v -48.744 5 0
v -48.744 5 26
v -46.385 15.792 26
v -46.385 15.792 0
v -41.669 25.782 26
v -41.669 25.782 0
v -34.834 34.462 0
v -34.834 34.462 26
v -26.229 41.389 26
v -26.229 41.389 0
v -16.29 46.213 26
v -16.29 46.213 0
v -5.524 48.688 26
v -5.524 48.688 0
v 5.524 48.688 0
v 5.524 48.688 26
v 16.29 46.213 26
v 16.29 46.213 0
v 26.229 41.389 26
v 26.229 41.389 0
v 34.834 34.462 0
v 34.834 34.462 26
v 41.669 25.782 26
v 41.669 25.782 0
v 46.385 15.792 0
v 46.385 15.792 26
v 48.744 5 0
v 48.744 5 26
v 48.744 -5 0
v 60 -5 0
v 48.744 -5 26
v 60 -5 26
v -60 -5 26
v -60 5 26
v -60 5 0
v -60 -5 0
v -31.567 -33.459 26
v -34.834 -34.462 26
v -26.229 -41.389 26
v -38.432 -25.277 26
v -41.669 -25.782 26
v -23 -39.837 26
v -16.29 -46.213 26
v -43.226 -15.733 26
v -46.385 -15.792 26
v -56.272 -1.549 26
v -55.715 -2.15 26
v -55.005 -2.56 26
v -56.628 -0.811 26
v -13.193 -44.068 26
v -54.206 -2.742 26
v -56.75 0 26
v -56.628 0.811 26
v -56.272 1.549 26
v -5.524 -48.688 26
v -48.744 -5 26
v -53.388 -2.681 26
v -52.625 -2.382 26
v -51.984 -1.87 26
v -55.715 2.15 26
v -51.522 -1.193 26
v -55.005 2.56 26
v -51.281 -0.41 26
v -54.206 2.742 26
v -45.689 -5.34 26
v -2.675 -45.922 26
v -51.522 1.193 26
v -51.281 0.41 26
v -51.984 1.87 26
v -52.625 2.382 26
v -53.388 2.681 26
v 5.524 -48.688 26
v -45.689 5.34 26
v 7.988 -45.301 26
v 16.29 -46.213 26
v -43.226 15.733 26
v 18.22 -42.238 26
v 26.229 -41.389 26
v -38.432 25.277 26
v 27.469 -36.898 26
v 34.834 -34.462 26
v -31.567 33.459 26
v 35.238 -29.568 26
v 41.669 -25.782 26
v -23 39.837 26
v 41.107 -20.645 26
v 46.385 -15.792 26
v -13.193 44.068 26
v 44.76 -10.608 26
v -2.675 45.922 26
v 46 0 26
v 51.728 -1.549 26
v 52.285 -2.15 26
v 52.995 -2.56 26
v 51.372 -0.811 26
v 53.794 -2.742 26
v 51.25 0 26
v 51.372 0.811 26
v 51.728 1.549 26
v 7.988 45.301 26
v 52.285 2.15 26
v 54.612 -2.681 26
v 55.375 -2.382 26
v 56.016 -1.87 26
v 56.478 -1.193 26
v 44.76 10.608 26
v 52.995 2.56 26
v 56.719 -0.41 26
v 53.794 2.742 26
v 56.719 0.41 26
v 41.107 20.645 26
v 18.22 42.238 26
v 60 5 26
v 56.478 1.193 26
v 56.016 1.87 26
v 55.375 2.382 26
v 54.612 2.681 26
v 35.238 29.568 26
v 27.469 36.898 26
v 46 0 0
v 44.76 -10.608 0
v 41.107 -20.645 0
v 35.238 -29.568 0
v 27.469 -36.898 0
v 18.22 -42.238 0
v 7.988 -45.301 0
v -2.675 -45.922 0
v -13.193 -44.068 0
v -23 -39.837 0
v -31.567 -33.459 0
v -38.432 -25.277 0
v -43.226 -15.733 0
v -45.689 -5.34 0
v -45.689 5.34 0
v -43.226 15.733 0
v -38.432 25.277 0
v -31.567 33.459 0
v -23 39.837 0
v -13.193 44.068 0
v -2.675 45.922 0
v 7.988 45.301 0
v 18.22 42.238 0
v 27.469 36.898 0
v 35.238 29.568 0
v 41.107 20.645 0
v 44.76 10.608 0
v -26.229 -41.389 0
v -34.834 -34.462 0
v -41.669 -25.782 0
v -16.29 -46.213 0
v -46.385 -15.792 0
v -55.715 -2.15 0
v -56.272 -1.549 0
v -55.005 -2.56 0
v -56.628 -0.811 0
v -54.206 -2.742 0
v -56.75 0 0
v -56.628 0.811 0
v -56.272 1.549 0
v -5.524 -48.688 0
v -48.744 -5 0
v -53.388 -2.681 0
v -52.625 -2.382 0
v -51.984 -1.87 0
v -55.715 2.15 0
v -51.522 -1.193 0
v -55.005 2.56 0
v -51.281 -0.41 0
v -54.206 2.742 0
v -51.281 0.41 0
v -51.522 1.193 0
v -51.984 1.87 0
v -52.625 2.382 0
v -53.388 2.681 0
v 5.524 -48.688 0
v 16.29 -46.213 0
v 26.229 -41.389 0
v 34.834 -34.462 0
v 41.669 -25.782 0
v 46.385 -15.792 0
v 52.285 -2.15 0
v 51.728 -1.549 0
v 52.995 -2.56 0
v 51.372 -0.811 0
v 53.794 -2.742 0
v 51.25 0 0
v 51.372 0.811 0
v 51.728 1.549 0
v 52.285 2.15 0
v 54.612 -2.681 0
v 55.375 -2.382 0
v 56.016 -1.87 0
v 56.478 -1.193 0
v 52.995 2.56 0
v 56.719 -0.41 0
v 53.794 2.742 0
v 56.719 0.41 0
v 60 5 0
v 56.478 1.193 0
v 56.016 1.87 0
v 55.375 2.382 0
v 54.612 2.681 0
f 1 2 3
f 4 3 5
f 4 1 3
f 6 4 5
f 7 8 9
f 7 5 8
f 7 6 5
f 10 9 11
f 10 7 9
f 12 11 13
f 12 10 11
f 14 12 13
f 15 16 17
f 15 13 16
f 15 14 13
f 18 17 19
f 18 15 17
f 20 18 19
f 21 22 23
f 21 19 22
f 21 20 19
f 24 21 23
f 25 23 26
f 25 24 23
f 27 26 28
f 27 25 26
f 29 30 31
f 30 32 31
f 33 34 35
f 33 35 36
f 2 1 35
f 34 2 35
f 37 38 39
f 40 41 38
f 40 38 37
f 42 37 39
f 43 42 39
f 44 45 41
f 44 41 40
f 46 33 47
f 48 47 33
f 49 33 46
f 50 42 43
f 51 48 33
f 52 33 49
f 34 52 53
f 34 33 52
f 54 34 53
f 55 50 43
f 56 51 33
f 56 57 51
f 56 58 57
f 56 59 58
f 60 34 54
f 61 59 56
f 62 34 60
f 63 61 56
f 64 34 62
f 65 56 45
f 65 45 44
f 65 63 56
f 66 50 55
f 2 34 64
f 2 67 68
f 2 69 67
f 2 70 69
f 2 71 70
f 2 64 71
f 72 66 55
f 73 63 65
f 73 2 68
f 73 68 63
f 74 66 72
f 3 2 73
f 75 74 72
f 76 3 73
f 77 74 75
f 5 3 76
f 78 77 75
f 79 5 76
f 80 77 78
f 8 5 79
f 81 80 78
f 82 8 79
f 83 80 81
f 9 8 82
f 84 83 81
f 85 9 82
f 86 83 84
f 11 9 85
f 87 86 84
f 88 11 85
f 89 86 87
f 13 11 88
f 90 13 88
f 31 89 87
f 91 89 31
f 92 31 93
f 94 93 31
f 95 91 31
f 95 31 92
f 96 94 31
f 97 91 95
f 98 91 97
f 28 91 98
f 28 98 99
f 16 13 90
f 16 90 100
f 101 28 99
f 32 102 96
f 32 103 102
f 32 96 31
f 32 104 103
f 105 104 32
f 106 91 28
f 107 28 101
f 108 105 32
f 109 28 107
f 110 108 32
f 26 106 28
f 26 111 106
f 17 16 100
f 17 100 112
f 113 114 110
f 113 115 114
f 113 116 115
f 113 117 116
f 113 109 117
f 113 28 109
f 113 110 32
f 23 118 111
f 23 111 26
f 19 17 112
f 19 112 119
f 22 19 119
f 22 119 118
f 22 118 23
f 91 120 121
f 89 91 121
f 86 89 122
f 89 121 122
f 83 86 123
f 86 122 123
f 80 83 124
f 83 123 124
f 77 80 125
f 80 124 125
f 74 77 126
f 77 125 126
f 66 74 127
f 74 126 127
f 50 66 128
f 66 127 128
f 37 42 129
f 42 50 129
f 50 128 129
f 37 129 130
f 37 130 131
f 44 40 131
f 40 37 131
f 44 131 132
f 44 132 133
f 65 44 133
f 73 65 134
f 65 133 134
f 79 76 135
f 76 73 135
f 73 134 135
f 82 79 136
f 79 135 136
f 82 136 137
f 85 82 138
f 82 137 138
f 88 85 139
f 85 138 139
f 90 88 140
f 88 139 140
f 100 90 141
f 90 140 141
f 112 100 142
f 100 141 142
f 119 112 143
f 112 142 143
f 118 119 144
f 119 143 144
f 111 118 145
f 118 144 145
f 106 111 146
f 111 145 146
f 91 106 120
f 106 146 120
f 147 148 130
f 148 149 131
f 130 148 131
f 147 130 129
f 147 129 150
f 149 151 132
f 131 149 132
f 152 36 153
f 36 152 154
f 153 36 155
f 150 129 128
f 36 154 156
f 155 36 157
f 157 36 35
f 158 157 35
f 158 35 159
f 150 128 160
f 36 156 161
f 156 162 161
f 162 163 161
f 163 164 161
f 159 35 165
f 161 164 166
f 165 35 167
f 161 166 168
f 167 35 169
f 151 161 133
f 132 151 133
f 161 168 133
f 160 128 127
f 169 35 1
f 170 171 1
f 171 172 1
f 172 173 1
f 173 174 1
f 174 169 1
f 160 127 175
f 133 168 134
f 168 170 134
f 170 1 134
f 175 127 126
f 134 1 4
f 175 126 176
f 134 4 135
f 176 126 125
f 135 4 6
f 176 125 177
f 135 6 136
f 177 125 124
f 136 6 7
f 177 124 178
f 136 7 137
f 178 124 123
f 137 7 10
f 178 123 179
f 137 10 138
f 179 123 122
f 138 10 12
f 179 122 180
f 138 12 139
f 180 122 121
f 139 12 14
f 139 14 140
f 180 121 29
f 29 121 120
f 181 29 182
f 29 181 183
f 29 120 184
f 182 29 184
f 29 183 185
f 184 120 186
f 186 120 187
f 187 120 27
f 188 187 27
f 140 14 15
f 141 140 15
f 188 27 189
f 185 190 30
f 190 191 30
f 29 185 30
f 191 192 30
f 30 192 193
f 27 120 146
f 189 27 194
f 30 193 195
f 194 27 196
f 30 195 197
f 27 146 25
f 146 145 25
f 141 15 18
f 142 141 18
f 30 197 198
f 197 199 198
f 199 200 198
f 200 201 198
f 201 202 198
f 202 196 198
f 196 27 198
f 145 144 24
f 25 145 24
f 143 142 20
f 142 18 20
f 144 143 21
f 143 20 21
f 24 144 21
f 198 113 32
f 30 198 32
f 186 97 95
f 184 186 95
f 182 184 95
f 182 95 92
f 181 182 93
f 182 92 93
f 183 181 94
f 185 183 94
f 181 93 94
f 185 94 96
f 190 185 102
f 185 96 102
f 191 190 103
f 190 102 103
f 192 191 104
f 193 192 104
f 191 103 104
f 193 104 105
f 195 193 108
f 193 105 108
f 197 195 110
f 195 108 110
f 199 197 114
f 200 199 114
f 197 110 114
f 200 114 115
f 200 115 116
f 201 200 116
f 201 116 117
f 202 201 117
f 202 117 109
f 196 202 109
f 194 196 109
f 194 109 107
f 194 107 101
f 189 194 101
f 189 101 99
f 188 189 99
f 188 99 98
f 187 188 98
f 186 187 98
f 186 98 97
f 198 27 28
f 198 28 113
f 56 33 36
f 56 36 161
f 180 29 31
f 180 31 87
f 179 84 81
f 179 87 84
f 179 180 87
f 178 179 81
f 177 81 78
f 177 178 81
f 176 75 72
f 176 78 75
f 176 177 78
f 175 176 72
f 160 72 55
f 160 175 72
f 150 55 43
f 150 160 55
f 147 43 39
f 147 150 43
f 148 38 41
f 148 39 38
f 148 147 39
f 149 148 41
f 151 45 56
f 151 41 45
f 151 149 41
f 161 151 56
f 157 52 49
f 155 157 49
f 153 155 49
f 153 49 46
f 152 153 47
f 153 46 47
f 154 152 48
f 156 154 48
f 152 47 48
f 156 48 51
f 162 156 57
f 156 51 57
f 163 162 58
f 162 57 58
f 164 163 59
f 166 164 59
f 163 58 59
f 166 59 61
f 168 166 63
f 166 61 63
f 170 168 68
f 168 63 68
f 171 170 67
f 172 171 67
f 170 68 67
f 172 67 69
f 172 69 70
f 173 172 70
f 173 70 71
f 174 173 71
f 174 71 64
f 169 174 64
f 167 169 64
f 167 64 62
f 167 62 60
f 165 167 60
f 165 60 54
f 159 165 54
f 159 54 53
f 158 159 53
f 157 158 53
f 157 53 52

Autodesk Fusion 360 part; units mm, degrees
sketch "Sketch1" plane through (0, 0, 0) normal (0, 0, 1) x (1, 0, 0)
  circle A0 centre (0, 0) radius 42 construction
  line L0 (0, 0) -> (0, 42) construction
  circle A1 centre (0, 42) radius 2.25
  circle A2 centre (-17.0829, 38.3689) radius 2.25
  circle A3 centre (-31.2121, 28.1035) radius 2.25
  circle A4 centre (-39.9444, 12.9787) radius 2.25
  circle A5 centre (-41.7699, -4.3902) radius 2.25
  circle A6 centre (-36.3731, -21) radius 2.25
  circle A7 centre (-24.687, -33.9787) radius 2.25
  circle A8 centre (-8.7323, -41.0822) radius 2.25
  circle A9 centre (8.7323, -41.0822) radius 2.25
  circle A10 centre (24.687, -33.9787) radius 2.25
  circle A11 centre (36.3731, -21) radius 2.25
  circle A12 centre (41.7699, -4.3902) radius 2.25
  circle A13 centre (39.9444, 12.9787) radius 2.25
  circle A14 centre (31.2121, 28.1035) radius 2.25
  circle A15 centre (17.0829, 38.3689) radius 2.25
  circle A16 centre (0, 42) radius 3 construction
  circle A17 centre (-17.0829, 38.3689) radius 3 construction
  circle A18 centre (-31.2121, 28.1035) radius 3 construction
  circle A19 centre (-39.9444, 12.9787) radius 3 construction
  circle A20 centre (-41.7699, -4.3902) radius 3 construction
  circle A21 centre (-36.3731, -21) radius 3 construction
  circle A22 centre (-24.687, -33.9787) radius 3 construction
  circle A23 centre (-8.7323, -41.0822) radius 3 construction
  circle A24 centre (8.7323, -41.0822) radius 3 construction
  circle A25 centre (24.687, -33.9787) radius 3 construction
  circle A26 centre (36.3731, -21) radius 3 construction
  circle A27 centre (41.7699, -4.3902) radius 3 construction
  circle A28 centre (39.9444, 12.9787) radius 3 construction
  circle A29 centre (31.2121, 28.1035) radius 3 construction
  circle A30 centre (17.0829, 38.3689) radius 3 construction
  circle A31 centre (0, 0) radius 46
  circle A32 centre (0, 0) radius 49
  dimension "d1" = 84
  dimension "d2" = 4.5
  dimension "d4" = 360
  dimension "d5" = 6
  dimension "d7" = 360
  dimension "d8" = 92
  dimension "d9" = 3
extrude "Extrude1" add sketch "Sketch1" along normal blind 26 contours A32
sketch "Sketch2" plane through (0, 0, 26) normal (0, 0, 1) x (-1, 0, 0)
  circle A0 centre (0, 0) radius 46
  circle A1 centre (0, 0) radius 49
  line L0 (0, 0) -> (-69, 0) construction
  line L1 (0, 0) -> (0, -46) construction
  line L2 (-48.7442, -5) -> (-60, -5)
  line L3 (-60, -5) -> (-60, 5)
  line L4 (-60, 5) -> (-48.7442, 5)
  circle A2 centre (-54, 0) radius 2.75
  line L5 (48.7442, -5) -> (60, -5)
  line L6 (60, -5) -> (60, 5)
  line L7 (60, 5) -> (48.7442, 5)
  circle A3 centre (54, 0) radius 2.75
  dimension "d12" = 5.5
  dimension "d13" = 54
  dimension "d14" = 6
  dimension "d15" = 10
extrude "Extrude2" add sketch "Sketch2" against normal blind 26 contours A1 L5 L6 L7 | A1 L2 L3 L4
